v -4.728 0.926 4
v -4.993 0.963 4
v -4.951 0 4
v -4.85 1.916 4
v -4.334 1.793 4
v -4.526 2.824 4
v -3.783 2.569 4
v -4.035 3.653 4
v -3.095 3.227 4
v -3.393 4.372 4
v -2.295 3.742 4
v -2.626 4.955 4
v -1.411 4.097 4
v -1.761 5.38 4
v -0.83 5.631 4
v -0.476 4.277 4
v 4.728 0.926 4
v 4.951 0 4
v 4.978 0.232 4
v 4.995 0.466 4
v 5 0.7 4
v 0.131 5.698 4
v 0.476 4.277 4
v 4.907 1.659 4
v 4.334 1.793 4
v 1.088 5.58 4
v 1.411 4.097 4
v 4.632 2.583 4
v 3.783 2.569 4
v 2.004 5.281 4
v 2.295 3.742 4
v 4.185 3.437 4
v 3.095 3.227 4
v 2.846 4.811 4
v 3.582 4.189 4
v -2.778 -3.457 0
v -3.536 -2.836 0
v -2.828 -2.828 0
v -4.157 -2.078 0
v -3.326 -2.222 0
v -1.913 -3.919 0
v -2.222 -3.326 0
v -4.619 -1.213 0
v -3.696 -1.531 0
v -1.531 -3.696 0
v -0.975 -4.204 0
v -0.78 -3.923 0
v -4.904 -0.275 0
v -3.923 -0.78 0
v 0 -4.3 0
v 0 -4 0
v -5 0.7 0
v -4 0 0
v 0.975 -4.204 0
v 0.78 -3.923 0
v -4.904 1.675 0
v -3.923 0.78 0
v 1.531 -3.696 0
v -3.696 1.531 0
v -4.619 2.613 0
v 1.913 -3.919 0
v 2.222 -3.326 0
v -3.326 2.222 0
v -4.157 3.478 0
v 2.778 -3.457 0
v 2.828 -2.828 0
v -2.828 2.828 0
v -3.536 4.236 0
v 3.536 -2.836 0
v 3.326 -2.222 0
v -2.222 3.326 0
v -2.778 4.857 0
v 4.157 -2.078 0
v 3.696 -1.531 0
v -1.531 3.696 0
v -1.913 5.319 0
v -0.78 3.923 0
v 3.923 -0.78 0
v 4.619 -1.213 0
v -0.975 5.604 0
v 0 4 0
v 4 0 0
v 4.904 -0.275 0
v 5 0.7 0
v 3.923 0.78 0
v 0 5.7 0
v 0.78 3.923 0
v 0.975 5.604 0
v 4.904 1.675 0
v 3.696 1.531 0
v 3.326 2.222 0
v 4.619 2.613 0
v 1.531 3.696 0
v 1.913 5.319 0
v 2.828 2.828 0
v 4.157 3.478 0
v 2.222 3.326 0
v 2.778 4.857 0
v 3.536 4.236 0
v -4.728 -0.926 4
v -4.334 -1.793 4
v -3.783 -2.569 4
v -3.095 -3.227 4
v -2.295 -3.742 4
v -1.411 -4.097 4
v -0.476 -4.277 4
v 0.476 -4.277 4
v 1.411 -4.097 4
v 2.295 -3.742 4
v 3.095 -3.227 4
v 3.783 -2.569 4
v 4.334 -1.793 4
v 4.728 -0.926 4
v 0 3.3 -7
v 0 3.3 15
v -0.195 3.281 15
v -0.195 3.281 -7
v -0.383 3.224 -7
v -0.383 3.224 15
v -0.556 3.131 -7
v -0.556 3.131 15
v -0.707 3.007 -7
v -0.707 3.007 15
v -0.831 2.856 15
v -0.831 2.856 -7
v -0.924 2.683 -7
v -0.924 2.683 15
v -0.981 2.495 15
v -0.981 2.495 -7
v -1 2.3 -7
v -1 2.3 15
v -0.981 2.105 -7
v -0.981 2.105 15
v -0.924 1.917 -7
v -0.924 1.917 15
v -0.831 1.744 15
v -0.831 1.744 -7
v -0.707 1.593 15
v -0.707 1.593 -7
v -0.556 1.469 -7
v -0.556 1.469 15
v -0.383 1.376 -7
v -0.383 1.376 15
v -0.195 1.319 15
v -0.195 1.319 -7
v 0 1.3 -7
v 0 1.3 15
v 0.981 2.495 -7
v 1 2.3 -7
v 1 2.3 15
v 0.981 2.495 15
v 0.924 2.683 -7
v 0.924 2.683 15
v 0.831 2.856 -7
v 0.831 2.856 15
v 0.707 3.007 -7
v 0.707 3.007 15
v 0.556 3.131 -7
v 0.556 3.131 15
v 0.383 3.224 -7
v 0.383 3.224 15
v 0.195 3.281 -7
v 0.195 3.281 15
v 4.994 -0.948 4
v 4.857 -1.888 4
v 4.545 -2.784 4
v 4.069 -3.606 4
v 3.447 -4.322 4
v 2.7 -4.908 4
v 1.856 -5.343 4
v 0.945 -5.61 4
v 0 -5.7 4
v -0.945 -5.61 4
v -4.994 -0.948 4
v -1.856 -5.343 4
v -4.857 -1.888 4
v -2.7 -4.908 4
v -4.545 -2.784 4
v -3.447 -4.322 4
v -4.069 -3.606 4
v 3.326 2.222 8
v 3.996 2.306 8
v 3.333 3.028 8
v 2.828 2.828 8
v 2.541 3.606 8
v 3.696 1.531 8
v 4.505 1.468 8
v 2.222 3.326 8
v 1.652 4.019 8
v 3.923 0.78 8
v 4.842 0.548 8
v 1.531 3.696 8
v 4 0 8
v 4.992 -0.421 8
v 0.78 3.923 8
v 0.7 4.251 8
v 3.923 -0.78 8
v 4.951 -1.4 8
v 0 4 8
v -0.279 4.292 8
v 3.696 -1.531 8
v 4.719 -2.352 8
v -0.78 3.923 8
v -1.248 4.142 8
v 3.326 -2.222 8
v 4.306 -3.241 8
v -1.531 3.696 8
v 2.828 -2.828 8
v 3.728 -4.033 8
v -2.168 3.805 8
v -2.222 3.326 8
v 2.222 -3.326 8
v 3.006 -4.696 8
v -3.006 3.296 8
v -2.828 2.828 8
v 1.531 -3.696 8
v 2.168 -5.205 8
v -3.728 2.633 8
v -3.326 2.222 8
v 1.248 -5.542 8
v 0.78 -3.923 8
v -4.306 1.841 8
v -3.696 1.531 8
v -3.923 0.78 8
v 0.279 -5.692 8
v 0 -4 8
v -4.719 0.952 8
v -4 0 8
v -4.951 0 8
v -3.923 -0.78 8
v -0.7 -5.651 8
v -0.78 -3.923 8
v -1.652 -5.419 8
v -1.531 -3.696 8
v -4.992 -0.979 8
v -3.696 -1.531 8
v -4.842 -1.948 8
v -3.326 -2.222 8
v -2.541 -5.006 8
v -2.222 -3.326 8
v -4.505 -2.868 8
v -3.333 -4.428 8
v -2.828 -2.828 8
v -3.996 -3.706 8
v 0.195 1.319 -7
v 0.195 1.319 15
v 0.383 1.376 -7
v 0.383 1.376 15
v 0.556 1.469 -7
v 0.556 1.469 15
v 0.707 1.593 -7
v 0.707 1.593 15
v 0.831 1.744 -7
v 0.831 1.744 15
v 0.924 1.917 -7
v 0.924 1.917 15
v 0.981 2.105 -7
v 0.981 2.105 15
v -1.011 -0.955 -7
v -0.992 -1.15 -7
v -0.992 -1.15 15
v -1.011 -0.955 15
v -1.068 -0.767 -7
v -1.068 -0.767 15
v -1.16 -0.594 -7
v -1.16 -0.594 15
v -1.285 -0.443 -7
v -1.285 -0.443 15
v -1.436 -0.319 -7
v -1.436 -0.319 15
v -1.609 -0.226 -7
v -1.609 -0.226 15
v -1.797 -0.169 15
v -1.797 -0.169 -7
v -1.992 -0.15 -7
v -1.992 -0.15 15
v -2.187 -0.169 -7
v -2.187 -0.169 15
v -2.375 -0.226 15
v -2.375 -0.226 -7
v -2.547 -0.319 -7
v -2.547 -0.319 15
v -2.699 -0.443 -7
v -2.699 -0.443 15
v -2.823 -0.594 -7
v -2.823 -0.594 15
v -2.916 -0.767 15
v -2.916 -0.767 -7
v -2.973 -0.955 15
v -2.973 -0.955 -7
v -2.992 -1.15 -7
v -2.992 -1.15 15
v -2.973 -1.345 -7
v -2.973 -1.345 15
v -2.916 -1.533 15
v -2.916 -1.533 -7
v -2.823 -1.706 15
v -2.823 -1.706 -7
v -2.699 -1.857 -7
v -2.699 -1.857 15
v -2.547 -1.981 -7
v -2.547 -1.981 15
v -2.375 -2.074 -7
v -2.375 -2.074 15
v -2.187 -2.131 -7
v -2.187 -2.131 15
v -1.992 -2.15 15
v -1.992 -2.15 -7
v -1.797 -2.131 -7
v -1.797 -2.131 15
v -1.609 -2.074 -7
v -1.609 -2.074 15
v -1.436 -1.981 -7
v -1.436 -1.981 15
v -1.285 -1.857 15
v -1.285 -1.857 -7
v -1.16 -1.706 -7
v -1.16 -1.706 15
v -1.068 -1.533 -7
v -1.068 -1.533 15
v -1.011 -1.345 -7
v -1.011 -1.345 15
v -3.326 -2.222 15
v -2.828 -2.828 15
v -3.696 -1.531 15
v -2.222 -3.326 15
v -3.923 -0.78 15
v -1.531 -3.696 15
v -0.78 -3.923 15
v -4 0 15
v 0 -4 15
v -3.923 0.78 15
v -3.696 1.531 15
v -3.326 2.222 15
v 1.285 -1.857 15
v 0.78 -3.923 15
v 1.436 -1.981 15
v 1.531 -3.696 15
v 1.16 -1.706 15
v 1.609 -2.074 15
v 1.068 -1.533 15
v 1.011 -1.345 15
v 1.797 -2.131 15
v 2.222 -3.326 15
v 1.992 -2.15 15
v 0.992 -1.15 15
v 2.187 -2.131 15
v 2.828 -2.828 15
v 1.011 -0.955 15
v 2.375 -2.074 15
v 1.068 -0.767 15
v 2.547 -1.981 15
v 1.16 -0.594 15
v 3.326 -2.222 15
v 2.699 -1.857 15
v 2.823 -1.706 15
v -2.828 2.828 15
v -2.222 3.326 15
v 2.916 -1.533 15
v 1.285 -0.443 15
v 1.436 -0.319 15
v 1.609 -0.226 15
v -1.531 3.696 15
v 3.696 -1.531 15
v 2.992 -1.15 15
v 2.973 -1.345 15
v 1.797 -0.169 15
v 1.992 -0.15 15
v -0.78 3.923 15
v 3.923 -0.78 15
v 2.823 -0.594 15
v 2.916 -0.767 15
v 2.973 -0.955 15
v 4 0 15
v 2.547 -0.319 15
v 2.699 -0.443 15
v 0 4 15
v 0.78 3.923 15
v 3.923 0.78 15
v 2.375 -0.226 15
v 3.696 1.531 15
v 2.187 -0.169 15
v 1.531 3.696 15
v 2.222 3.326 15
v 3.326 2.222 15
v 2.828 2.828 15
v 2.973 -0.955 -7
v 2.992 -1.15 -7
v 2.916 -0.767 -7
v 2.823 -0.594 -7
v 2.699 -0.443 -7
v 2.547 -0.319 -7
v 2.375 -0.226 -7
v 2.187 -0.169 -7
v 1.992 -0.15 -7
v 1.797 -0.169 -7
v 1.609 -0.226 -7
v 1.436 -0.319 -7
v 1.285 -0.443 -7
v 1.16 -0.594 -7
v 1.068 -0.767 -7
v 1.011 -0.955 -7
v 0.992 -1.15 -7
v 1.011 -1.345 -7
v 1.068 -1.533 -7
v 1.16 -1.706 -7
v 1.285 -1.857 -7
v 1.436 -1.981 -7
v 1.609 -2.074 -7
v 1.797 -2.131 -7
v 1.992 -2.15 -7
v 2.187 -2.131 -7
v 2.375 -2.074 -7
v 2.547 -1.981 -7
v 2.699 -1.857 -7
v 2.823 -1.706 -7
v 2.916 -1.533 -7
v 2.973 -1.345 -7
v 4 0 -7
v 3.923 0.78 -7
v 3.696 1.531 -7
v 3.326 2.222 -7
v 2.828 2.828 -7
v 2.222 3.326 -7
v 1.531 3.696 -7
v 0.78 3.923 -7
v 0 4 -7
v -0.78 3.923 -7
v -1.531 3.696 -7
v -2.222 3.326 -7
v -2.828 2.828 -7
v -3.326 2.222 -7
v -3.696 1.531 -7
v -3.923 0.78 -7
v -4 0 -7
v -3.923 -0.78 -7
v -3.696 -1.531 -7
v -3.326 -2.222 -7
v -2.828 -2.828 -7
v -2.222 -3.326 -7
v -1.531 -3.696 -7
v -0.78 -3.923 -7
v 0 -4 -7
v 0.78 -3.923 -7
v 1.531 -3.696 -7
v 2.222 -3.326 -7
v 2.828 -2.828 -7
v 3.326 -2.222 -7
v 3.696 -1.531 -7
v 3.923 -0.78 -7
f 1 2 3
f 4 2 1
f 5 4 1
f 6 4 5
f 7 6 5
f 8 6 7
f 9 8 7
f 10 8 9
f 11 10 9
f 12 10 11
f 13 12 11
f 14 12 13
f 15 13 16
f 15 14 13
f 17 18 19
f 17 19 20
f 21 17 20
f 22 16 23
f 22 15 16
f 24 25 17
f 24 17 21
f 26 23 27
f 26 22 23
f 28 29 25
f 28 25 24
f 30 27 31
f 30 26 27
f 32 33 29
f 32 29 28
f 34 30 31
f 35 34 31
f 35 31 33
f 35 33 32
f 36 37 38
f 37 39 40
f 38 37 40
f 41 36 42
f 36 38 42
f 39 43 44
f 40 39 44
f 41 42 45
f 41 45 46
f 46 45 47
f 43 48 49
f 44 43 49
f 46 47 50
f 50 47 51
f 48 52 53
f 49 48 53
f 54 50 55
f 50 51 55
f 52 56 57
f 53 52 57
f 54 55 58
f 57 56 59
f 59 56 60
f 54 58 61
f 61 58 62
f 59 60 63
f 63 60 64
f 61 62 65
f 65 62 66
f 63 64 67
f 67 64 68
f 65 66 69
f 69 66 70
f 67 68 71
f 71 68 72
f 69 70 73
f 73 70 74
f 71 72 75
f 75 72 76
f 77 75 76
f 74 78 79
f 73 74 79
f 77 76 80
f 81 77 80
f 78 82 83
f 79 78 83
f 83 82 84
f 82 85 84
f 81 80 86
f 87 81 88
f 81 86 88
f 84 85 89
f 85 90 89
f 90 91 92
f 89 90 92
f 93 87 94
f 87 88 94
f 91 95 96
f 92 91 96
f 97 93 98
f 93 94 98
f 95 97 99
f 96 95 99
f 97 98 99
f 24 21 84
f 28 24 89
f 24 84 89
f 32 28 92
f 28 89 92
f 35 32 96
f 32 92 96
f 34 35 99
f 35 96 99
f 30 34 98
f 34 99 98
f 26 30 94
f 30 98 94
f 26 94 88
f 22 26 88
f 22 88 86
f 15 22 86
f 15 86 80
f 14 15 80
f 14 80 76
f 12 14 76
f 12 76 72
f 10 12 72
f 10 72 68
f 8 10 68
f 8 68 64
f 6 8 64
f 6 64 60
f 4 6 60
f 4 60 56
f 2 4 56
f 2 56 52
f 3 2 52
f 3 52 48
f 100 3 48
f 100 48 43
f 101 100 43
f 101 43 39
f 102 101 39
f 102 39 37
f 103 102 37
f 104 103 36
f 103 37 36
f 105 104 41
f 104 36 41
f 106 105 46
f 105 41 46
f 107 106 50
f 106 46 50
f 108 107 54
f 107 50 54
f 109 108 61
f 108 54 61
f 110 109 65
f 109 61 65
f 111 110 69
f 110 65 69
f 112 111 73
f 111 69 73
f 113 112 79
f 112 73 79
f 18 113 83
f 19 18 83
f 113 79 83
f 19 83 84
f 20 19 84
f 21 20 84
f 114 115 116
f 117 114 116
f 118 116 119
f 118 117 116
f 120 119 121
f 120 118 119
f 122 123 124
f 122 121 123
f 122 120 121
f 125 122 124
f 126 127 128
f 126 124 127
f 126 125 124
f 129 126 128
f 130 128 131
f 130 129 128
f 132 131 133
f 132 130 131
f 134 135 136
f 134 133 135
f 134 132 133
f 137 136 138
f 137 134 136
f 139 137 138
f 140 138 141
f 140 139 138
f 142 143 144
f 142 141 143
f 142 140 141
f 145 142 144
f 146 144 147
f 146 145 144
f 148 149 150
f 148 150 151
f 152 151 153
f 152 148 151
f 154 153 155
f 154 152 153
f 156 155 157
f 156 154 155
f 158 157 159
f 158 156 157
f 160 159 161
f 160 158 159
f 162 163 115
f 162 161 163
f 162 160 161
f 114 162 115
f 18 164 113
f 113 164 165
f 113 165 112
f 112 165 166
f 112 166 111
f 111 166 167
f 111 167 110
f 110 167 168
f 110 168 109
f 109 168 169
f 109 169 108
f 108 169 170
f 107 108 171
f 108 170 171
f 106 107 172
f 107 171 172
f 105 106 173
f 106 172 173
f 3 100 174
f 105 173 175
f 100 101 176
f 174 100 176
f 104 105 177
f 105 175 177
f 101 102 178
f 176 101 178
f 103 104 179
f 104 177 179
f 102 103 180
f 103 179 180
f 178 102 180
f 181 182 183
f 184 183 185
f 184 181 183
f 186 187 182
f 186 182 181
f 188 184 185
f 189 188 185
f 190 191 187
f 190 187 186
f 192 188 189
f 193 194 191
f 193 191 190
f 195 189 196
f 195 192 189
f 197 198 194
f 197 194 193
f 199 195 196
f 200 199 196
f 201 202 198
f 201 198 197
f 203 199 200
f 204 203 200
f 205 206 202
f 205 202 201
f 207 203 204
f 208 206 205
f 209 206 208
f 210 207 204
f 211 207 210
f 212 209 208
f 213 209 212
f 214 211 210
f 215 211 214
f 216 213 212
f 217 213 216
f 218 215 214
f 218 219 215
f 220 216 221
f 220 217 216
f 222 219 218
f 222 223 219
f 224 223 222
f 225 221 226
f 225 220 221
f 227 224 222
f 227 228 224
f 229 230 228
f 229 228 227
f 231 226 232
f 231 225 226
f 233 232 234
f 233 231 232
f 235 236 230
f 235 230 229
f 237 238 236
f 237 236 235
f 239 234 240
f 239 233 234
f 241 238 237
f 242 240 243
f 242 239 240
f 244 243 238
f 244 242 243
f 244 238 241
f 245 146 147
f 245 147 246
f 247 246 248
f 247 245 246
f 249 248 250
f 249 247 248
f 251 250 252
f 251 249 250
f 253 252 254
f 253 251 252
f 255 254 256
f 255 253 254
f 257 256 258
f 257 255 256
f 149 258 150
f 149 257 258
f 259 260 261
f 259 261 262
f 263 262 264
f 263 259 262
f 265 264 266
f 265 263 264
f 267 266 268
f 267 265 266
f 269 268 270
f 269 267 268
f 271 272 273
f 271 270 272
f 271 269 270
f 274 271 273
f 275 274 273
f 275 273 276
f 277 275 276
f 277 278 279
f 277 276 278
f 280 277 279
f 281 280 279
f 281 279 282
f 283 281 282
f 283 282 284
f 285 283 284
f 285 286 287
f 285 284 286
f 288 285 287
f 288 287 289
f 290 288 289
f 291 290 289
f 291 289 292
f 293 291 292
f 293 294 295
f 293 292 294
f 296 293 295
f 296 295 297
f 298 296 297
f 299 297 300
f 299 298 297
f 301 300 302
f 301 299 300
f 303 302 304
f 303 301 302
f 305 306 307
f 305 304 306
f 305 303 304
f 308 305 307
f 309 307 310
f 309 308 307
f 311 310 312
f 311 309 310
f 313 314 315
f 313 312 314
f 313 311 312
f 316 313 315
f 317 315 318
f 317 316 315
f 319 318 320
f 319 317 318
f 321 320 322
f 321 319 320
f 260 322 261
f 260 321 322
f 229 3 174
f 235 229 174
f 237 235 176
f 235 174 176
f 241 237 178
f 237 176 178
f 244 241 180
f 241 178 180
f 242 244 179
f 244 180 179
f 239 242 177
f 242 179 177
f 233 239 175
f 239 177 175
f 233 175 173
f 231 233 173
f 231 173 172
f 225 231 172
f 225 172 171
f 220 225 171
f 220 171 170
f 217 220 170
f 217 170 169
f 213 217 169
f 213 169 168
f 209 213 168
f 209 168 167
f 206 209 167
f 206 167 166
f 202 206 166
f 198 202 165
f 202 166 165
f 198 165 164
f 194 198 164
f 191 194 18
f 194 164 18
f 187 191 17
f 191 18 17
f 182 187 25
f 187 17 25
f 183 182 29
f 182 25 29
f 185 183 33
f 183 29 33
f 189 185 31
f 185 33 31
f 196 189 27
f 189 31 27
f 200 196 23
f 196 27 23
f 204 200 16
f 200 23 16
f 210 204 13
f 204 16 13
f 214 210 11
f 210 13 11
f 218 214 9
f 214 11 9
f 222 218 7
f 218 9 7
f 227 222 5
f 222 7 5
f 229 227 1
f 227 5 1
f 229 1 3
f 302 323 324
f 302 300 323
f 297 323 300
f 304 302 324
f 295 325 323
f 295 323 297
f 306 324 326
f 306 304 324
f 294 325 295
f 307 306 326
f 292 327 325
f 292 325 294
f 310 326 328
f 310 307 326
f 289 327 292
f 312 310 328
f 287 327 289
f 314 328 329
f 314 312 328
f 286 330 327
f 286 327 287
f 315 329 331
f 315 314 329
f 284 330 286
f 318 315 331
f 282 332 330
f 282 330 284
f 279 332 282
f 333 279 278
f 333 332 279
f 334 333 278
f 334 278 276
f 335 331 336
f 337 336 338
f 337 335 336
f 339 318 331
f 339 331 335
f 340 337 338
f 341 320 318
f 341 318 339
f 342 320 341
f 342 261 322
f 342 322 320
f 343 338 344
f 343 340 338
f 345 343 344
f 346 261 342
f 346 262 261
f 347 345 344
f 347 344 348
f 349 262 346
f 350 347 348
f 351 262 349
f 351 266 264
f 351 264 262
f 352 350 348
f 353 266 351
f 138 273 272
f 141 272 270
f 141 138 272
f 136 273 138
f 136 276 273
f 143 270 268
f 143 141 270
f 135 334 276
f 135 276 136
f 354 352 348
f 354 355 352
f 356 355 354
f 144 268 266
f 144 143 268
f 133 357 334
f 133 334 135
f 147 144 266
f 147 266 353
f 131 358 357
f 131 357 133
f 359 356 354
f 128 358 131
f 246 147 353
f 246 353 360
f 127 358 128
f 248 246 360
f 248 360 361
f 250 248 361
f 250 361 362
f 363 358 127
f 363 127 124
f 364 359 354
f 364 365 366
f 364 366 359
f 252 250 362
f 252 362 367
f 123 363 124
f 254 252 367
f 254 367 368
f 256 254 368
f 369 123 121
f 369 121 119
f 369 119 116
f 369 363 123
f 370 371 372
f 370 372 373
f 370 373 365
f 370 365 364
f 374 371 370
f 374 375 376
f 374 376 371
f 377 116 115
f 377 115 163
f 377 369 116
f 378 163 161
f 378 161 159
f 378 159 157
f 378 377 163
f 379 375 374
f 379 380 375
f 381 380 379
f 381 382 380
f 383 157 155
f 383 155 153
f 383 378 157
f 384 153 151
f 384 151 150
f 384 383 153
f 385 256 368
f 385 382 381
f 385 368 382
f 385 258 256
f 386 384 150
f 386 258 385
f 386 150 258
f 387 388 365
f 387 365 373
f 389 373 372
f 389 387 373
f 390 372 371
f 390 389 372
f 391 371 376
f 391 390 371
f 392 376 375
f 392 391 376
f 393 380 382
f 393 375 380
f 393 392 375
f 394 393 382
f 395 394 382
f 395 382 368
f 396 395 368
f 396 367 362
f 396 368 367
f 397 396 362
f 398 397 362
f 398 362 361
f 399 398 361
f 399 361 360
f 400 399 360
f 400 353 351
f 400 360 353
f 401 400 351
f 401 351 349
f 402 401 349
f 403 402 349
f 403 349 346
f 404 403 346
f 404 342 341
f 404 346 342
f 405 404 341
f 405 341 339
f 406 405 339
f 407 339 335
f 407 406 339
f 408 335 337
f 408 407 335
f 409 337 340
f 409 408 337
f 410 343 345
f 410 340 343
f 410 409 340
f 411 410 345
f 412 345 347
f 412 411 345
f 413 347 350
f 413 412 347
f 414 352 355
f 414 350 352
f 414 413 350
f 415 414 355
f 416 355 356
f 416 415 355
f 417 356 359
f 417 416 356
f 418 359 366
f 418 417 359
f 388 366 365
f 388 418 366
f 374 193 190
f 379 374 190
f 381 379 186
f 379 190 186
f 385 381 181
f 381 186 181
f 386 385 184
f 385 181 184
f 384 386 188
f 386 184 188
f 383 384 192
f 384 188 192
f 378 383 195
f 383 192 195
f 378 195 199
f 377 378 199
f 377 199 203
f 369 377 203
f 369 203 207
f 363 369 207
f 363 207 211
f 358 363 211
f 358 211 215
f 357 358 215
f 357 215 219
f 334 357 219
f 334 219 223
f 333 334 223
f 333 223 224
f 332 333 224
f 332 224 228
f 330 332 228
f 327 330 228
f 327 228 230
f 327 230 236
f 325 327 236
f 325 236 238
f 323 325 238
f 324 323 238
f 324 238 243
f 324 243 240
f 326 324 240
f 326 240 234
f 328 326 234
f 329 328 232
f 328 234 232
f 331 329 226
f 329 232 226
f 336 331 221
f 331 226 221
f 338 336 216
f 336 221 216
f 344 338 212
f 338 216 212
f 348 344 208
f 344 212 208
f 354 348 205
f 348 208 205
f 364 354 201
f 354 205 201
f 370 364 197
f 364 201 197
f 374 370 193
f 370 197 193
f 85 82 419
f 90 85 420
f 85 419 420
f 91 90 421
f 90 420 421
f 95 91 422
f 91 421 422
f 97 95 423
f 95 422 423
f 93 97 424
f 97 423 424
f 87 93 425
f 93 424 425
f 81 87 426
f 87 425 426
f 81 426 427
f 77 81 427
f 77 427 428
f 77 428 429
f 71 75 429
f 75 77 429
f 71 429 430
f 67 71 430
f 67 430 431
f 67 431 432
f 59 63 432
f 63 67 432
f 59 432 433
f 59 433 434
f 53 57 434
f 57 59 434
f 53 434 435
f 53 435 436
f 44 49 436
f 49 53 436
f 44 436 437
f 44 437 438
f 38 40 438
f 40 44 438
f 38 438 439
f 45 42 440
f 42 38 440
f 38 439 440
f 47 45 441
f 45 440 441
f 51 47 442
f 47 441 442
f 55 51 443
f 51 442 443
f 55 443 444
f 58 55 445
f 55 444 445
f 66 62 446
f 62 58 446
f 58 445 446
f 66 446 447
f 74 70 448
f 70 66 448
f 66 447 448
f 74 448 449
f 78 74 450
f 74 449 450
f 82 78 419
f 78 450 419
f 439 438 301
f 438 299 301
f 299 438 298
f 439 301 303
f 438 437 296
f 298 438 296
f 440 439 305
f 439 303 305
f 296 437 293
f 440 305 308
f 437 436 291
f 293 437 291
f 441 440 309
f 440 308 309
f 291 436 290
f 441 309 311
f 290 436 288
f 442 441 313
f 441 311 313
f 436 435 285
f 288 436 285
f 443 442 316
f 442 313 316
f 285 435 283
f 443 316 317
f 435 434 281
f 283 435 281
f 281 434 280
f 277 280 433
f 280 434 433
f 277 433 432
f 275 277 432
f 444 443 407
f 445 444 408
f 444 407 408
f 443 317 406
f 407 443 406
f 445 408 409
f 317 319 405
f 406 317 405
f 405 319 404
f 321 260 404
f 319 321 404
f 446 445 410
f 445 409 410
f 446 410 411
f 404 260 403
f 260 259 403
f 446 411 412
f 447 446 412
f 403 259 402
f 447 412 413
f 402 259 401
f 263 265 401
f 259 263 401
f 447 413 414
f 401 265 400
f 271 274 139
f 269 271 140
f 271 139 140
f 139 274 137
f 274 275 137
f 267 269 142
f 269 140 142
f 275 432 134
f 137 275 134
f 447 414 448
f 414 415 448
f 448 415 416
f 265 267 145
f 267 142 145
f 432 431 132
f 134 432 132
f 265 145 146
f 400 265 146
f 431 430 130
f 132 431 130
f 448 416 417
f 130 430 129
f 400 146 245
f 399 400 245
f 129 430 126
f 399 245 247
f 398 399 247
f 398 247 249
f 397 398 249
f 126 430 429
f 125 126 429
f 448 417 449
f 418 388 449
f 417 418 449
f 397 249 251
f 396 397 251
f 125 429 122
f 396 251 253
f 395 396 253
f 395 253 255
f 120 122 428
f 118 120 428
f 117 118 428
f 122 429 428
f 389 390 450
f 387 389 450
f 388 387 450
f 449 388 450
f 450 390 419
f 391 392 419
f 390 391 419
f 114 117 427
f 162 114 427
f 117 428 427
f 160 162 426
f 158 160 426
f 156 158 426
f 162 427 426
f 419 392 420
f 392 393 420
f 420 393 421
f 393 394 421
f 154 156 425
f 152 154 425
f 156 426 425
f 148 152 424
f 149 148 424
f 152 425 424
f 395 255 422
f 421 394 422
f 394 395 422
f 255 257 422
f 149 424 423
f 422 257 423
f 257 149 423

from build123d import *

# Parameters (mm, degrees)
SKETCH1_R                = 5
BOSS_EXTRUDE1_DEPTH      = 4
BOSS_EXTRUDE2_START      = 4
SKETCH2_R                = 5
BOSS_EXTRUDE2_DEPTH      = 4
BOSS_EXTRUDE5_DEPTH      = 15
BOSS_EXTRUDE5_DEPTH_BACK = 7
SKETCH5_R                = 4
CUT_EXTRUDE1_DEPTH       = 17.807438829
CUT_EXTRUDE1_DEPTH_BACK  = 17.807438829
SKETCH9_R                = 1


with BuildPart() as part:
    # Sketch1 → Boss-Extrude1 (new body)
    with BuildSketch(Plane.XY):
        with Locations((0, 0.7)):
            Circle(SKETCH1_R)
    extrude(amount=BOSS_EXTRUDE1_DEPTH)

    # Sketch2 → Boss-Extrude2 (add)
    with BuildSketch(Plane.XY.offset(BOSS_EXTRUDE2_START)):
        with Locations(Location((0, -0.7, 0), (0, 0, 171.952153753))):
            Circle(SKETCH2_R)
    extrude(amount=BOSS_EXTRUDE2_DEPTH)

    # Sketch5 → Boss-Extrude5 (add, two sides: drawn at the far end of the back side and taken through both)
    with BuildSketch(Plane.XY.offset(-BOSS_EXTRUDE5_DEPTH_BACK)):
        Circle(SKETCH5_R)
    extrude(amount=BOSS_EXTRUDE5_DEPTH + BOSS_EXTRUDE5_DEPTH_BACK)

    # Sketch9 → Cut-Extrude1 (cut, two sides: drawn at the far end of the back side and taken through both)
    with BuildSketch(Plane.XY.offset(-CUT_EXTRUDE1_DEPTH_BACK)):
        with BuildLine():
            ThreePointArc((0, 3.3), (-1, 2.3), (0, 1.3))
            Line((0, 1.3), (0, 3.3))
        make_face()
        with BuildLine():
            Line((0, 3.3), (0, 1.3))
            ThreePointArc((0, 1.3), (0.707106781, 1.592893219), (1, 2.3))
            ThreePointArc((1, 2.3), (0.707106781, 3.007106781), (0, 3.3))
        make_face()
        with Locations((-1.991858429, -1.15)):
            Circle(SKETCH9_R)
        with Locations((1.991858429, -1.15)):
            Circle(SKETCH9_R)
    extrude(amount=CUT_EXTRUDE1_DEPTH + CUT_EXTRUDE1_DEPTH_BACK, mode=Mode.SUBTRACT)


solid = part.part
